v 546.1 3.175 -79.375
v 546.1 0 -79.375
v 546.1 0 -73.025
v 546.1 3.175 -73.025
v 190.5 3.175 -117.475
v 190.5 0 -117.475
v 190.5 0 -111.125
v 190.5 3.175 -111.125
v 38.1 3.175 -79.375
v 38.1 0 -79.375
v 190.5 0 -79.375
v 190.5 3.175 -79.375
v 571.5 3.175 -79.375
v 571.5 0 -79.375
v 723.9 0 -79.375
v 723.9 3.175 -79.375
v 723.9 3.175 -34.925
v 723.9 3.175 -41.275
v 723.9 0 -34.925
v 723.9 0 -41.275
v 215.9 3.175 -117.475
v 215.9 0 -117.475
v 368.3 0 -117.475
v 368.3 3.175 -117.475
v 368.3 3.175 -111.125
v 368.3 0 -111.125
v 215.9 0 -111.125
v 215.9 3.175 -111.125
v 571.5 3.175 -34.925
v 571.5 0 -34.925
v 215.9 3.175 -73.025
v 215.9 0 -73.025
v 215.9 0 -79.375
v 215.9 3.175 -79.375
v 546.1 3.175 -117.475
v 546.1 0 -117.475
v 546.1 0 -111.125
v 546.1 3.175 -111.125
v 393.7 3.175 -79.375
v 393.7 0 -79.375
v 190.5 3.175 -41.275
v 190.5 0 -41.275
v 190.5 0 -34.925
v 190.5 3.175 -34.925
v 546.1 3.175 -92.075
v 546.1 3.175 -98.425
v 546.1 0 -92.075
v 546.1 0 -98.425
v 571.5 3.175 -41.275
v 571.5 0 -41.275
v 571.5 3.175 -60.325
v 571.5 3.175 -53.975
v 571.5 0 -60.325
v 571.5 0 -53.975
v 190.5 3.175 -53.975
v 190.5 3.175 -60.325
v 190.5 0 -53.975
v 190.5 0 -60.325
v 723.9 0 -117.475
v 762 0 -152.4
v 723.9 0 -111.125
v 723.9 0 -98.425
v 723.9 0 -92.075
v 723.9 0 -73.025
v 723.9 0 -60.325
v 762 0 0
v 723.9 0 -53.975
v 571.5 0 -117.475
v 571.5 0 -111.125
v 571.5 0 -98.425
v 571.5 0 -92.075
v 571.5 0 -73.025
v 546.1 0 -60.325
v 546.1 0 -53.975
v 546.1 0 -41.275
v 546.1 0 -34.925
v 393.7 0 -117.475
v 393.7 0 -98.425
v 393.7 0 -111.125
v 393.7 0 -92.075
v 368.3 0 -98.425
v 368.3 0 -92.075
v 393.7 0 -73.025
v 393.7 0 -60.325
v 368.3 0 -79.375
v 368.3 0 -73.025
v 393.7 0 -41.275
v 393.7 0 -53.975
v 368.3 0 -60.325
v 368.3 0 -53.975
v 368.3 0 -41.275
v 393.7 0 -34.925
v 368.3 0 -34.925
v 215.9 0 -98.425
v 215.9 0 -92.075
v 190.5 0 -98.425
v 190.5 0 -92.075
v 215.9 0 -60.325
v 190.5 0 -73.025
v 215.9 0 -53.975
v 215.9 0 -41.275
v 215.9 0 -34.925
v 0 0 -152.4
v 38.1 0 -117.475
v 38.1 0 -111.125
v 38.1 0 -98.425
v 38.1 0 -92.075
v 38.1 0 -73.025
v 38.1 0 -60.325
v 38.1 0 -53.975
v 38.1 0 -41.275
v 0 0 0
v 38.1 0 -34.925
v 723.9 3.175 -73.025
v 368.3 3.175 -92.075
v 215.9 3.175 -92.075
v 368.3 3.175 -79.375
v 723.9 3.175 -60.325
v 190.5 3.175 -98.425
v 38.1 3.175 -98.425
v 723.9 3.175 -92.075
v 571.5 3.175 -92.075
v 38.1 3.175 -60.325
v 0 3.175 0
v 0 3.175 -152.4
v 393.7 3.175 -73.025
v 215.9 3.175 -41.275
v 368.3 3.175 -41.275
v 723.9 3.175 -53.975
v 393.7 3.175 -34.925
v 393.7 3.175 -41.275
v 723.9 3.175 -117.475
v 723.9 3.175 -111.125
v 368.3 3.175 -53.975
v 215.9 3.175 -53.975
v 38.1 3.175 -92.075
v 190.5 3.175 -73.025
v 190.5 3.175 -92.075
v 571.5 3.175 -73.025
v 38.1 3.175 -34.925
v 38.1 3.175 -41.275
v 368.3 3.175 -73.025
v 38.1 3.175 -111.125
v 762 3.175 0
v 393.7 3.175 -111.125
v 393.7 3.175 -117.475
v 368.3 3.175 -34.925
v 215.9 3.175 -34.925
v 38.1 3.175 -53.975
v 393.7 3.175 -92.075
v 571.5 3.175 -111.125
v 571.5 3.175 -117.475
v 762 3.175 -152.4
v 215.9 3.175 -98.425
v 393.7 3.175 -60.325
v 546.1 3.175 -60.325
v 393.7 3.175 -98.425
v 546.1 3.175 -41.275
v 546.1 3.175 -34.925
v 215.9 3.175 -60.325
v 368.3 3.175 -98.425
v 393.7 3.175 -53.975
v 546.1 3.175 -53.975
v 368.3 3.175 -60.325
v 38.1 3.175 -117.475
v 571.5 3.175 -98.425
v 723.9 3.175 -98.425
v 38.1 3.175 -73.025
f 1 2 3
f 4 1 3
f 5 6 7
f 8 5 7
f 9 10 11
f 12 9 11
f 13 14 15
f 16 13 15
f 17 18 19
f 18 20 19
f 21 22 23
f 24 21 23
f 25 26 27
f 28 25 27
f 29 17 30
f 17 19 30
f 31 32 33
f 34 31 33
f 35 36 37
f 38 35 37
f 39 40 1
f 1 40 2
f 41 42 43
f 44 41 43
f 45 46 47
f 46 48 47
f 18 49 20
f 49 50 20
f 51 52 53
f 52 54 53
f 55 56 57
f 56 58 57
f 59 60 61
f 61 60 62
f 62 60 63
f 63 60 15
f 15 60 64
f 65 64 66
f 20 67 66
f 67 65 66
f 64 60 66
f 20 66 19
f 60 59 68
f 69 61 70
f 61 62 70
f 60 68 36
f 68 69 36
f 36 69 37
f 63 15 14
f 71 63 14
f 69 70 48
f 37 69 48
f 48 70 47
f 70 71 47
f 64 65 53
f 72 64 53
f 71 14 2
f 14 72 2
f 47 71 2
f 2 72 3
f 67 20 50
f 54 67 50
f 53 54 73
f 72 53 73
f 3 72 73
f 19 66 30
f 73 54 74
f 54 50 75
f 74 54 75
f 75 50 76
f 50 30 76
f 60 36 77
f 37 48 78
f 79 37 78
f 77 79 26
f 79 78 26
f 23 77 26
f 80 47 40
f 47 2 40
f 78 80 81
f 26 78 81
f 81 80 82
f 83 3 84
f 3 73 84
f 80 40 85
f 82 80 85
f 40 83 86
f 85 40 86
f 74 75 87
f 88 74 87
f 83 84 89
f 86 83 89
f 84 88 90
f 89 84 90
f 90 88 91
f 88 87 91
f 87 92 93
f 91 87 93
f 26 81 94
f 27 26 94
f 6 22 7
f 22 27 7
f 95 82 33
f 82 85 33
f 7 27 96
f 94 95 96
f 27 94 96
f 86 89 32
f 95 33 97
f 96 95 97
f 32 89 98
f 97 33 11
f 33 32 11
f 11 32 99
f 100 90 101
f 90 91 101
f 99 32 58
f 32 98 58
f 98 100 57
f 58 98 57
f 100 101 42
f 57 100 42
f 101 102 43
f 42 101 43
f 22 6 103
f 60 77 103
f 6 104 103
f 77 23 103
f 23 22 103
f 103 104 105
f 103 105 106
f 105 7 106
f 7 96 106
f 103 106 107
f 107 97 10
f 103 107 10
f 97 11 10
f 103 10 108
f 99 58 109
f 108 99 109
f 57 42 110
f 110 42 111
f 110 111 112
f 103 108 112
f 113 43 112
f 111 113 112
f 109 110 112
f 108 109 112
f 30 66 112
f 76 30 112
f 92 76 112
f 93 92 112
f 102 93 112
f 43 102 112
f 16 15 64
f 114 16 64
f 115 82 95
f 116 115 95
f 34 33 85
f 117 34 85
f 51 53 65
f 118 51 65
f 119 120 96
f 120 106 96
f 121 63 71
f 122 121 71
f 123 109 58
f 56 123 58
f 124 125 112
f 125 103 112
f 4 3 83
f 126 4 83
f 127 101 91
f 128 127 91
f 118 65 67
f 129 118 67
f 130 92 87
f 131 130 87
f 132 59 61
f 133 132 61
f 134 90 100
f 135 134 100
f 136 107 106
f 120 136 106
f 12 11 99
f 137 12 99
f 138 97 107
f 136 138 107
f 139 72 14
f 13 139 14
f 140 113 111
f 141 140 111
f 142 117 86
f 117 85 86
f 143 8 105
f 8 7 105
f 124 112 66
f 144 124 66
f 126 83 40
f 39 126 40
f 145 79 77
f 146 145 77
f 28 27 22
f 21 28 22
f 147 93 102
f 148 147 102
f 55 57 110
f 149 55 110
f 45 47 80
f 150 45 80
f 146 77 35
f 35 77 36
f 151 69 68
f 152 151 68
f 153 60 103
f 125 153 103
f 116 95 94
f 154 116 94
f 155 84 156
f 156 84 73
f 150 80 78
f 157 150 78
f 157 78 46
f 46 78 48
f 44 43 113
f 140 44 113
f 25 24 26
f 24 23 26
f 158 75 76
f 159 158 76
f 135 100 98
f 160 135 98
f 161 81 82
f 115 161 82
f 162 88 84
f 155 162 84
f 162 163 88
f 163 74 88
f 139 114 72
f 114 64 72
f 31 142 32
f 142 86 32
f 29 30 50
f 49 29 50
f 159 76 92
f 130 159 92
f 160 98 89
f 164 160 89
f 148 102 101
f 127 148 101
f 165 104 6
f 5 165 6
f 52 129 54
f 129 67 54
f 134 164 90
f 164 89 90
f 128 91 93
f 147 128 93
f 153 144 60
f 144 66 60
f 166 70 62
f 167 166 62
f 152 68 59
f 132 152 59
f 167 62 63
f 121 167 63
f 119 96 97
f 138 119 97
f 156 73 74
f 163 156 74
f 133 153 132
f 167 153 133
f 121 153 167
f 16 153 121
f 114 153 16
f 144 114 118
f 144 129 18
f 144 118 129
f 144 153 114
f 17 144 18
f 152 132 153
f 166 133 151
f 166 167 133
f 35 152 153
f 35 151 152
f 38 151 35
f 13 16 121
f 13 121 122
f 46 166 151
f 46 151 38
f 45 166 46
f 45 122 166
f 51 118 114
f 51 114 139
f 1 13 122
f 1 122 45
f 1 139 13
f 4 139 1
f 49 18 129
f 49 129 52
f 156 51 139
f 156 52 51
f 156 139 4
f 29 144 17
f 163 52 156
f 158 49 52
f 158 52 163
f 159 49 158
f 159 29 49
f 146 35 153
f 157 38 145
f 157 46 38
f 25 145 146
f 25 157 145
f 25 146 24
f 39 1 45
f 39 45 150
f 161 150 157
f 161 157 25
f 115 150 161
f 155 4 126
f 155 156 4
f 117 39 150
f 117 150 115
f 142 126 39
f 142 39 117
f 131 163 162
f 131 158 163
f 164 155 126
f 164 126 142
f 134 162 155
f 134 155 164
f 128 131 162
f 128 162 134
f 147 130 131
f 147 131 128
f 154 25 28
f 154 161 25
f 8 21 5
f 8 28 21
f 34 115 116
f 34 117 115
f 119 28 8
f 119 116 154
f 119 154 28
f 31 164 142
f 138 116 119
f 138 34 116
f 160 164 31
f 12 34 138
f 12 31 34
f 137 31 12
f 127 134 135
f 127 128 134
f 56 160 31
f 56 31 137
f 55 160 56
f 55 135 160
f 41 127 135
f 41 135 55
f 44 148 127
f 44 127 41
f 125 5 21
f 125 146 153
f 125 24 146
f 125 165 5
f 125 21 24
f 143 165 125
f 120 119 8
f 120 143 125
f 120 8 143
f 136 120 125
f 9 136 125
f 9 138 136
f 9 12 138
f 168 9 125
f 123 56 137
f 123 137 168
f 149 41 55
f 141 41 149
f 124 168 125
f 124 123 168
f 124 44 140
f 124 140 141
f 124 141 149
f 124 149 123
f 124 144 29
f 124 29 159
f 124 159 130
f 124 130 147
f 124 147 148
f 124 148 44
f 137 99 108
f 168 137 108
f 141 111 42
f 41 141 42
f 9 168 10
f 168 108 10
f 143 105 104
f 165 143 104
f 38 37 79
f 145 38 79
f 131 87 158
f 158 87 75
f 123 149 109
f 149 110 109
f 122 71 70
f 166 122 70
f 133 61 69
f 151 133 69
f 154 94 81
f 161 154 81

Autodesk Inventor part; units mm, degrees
ref_plane "YZ Plane" through (0, 0, 0) normal (1, 0, 0) x (0, 1, 0)
ref_plane "XZ Plane" through (0, 0, 0) normal (0, 1, 0) x (-1, 0, 0)
ref_plane "XY Plane" through (0, 0, 0) normal (0, 0, 1) x (1, 0, 0)
sketch "Sketch1" plane through (0, 0, 0) normal (0, 1, 0) x (-1, 0, 0)
  line L0 (0, 0) -> (-762, 0)
  line L1 (-762, 0) -> (-762, -152.4)
  line L2 (-762, -152.4) -> (0, -152.4)
  line L3 (0, -152.4) -> (0, 0)
  line L4 (-25.4, -25.4) -> (-736.6, -25.4)
  line L5 (-736.6, -25.4) -> (-736.6, -127)
  line L6 (-736.6, -127) -> (-25.4, -127)
  line L7 (-25.4, -127) -> (-25.4, -25.4)
  line L8 (-38.1, -117.475) -> (-190.5, -117.475)
  line L9 (-190.5, -117.475) -> (-190.5, -111.125)
  line L10 (-190.5, -111.125) -> (-38.1, -111.125)
  line L11 (-38.1, -111.125) -> (-38.1, -117.475)
  line L12 (-38.1, -98.425) -> (-190.5, -98.425)
  line L13 (-190.5, -98.425) -> (-190.5, -92.075)
  line L14 (-190.5, -92.075) -> (-38.1, -92.075)
  line L15 (-38.1, -92.075) -> (-38.1, -98.425)
  line L16 (-38.1, -79.375) -> (-190.5, -79.375)
  line L17 (-190.5, -79.375) -> (-190.5, -73.025)
  line L18 (-190.5, -73.025) -> (-38.1, -73.025)
  line L19 (-38.1, -73.025) -> (-38.1, -79.375)
  line L20 (-38.1, -60.325) -> (-190.5, -60.325)
  line L21 (-190.5, -60.325) -> (-190.5, -53.975)
  line L22 (-190.5, -53.975) -> (-38.1, -53.975)
  line L23 (-38.1, -53.975) -> (-38.1, -60.325)
  line L24 (-38.1, -41.275) -> (-190.5, -41.275)
  line L25 (-190.5, -41.275) -> (-190.5, -34.925)
  line L26 (-190.5, -34.925) -> (-38.1, -34.925)
  line L27 (-38.1, -34.925) -> (-38.1, -41.275)
  line L28 (-215.9, -117.475) -> (-368.3, -117.475)
  line L29 (-368.3, -117.475) -> (-368.3, -111.125)
  line L30 (-368.3, -111.125) -> (-215.9, -111.125)
  line L31 (-215.9, -111.125) -> (-215.9, -117.475)
  line L32 (-215.9, -92.075) -> (-215.9, -98.425)
  line L33 (-215.9, -98.425) -> (-368.3, -98.425)
  line L34 (-368.3, -98.425) -> (-368.3, -92.075)
  line L35 (-368.3, -92.075) -> (-215.9, -92.075)
  line L36 (-215.9, -73.025) -> (-215.9, -79.375)
  line L37 (-215.9, -79.375) -> (-368.3, -79.375)
  line L38 (-368.3, -79.375) -> (-368.3, -73.025)
  line L39 (-368.3, -73.025) -> (-215.9, -73.025)
  line L40 (-215.9, -53.975) -> (-215.9, -60.325)
  line L41 (-215.9, -60.325) -> (-368.3, -60.325)
  line L42 (-368.3, -60.325) -> (-368.3, -53.975)
  line L43 (-368.3, -53.975) -> (-215.9, -53.975)
  line L44 (-215.9, -34.925) -> (-215.9, -41.275)
  line L45 (-215.9, -41.275) -> (-368.3, -41.275)
  line L46 (-368.3, -41.275) -> (-368.3, -34.925)
  line L47 (-368.3, -34.925) -> (-215.9, -34.925)
  line L48 (-393.7, -117.475) -> (-546.1, -117.475)
  line L49 (-546.1, -117.475) -> (-546.1, -111.125)
  line L50 (-546.1, -111.125) -> (-393.7, -111.125)
  line L51 (-393.7, -111.125) -> (-393.7, -117.475)
  line L52 (-393.7, -92.075) -> (-393.7, -98.425)
  line L53 (-393.7, -98.425) -> (-546.1, -98.425)
  line L54 (-546.1, -98.425) -> (-546.1, -92.075)
  line L55 (-546.1, -92.075) -> (-393.7, -92.075)
  line L56 (-393.7, -73.025) -> (-393.7, -79.375)
  line L57 (-393.7, -79.375) -> (-546.1, -79.375)
  line L58 (-546.1, -79.375) -> (-546.1, -73.025)
  line L59 (-546.1, -73.025) -> (-393.7, -73.025)
  line L60 (-393.7, -53.975) -> (-393.7, -60.325)
  line L61 (-393.7, -60.325) -> (-546.1, -60.325)
  line L62 (-546.1, -60.325) -> (-546.1, -53.975)
  line L63 (-546.1, -53.975) -> (-393.7, -53.975)
  line L64 (-393.7, -34.925) -> (-393.7, -41.275)
  line L65 (-393.7, -41.275) -> (-546.1, -41.275)
  line L66 (-546.1, -41.275) -> (-546.1, -34.925)
  line L67 (-546.1, -34.925) -> (-393.7, -34.925)
  line L68 (-571.5, -117.475) -> (-723.9, -117.475)
  line L69 (-723.9, -117.475) -> (-723.9, -111.125)
  line L70 (-723.9, -111.125) -> (-571.5, -111.125)
  line L71 (-571.5, -111.125) -> (-571.5, -117.475)
  line L72 (-571.5, -92.075) -> (-571.5, -98.425)
  line L73 (-571.5, -98.425) -> (-723.9, -98.425)
  line L74 (-723.9, -98.425) -> (-723.9, -92.075)
  line L75 (-723.9, -92.075) -> (-571.5, -92.075)
  line L76 (-571.5, -73.025) -> (-571.5, -79.375)
  line L77 (-571.5, -79.375) -> (-723.9, -79.375)
  line L78 (-723.9, -79.375) -> (-723.9, -73.025)
  line L79 (-723.9, -73.025) -> (-571.5, -73.025)
  line L80 (-571.5, -53.975) -> (-571.5, -60.325)
  line L81 (-571.5, -60.325) -> (-723.9, -60.325)
  line L82 (-723.9, -60.325) -> (-723.9, -53.975)
  line L83 (-723.9, -53.975) -> (-571.5, -53.975)
  line L84 (-571.5, -34.925) -> (-571.5, -41.275)
  line L85 (-571.5, -41.275) -> (-723.9, -41.275)
  line L86 (-723.9, -41.275) -> (-723.9, -34.925)
  line L87 (-723.9, -34.925) -> (-571.5, -34.925)
  dimension "d0" = 762
  dimension "d1" = 152.4
  dimension "d2" = 25.4
  dimension "d3" = 25.4
  dimension "d4" = 25.4
  dimension "d5" = 25.4
  dimension "d6" = 6.35
  dimension "d7" = 12.7
  dimension "d8" = 9.525
  dimension "d9" = 152.4
  dimension "d10" = 6.35
  dimension "d11" = 152.4
  dimension "d12" = 6.35
  dimension "d13" = 152.4
  dimension "d14" = 6.35
  dimension "d15" = 152.4
  dimension "d16" = 6.35
  dimension "d17" = 152.4
  dimension "d18" = 12.7
  dimension "d19" = 12.7
  dimension "d20" = 12.7
  dimension "d21" = 12.7
  dimension "d22" = 12.7
  dimension "d23" = 12.7
  dimension "d24" = 12.7
  dimension "d25" = 12.7
  dimension "d26" = 6.35
  dimension "d27" = 152.4
  dimension "d28" = 6.35
  dimension "d29" = 152.4
  dimension "d30" = 6.35
  dimension "d31" = 152.4
  dimension "d32" = 6.35
  dimension "d33" = 152.4
  dimension "d34" = 6.35
  dimension "d35" = 152.4
  dimension "d36" = 12.7
  dimension "d37" = 12.7
  dimension "d38" = 12.7
  dimension "d39" = 12.7
  dimension "d40" = 6.35
  dimension "d41" = 152.4
  dimension "d42" = 6.35
  dimension "d43" = 152.4
  dimension "d44" = 6.35
  dimension "d45" = 152.4
  dimension "d46" = 6.35
  dimension "d47" = 152.4
  dimension "d48" = 6.35
  dimension "d49" = 152.4
  dimension "d50" = 12.7
  dimension "d51" = 12.7
  dimension "d52" = 12.7
  dimension "d53" = 12.7
  dimension "d54" = 6.35
  dimension "d55" = 152.4
  dimension "d56" = 6.35
  dimension "d57" = 152.4
  dimension "d58" = 6.35
  dimension "d59" = 152.4
  dimension "d60" = 6.35
  dimension "d61" = 152.4
  dimension "d62" = 6.35
  dimension "d63" = 152.4
extrude "Extrusion1" add sketch "Sketch1" along normal blind 3.175 contours L3 L2 L1 L0 | L7 L6 L5 L4
properties part number "28 inch grill"
